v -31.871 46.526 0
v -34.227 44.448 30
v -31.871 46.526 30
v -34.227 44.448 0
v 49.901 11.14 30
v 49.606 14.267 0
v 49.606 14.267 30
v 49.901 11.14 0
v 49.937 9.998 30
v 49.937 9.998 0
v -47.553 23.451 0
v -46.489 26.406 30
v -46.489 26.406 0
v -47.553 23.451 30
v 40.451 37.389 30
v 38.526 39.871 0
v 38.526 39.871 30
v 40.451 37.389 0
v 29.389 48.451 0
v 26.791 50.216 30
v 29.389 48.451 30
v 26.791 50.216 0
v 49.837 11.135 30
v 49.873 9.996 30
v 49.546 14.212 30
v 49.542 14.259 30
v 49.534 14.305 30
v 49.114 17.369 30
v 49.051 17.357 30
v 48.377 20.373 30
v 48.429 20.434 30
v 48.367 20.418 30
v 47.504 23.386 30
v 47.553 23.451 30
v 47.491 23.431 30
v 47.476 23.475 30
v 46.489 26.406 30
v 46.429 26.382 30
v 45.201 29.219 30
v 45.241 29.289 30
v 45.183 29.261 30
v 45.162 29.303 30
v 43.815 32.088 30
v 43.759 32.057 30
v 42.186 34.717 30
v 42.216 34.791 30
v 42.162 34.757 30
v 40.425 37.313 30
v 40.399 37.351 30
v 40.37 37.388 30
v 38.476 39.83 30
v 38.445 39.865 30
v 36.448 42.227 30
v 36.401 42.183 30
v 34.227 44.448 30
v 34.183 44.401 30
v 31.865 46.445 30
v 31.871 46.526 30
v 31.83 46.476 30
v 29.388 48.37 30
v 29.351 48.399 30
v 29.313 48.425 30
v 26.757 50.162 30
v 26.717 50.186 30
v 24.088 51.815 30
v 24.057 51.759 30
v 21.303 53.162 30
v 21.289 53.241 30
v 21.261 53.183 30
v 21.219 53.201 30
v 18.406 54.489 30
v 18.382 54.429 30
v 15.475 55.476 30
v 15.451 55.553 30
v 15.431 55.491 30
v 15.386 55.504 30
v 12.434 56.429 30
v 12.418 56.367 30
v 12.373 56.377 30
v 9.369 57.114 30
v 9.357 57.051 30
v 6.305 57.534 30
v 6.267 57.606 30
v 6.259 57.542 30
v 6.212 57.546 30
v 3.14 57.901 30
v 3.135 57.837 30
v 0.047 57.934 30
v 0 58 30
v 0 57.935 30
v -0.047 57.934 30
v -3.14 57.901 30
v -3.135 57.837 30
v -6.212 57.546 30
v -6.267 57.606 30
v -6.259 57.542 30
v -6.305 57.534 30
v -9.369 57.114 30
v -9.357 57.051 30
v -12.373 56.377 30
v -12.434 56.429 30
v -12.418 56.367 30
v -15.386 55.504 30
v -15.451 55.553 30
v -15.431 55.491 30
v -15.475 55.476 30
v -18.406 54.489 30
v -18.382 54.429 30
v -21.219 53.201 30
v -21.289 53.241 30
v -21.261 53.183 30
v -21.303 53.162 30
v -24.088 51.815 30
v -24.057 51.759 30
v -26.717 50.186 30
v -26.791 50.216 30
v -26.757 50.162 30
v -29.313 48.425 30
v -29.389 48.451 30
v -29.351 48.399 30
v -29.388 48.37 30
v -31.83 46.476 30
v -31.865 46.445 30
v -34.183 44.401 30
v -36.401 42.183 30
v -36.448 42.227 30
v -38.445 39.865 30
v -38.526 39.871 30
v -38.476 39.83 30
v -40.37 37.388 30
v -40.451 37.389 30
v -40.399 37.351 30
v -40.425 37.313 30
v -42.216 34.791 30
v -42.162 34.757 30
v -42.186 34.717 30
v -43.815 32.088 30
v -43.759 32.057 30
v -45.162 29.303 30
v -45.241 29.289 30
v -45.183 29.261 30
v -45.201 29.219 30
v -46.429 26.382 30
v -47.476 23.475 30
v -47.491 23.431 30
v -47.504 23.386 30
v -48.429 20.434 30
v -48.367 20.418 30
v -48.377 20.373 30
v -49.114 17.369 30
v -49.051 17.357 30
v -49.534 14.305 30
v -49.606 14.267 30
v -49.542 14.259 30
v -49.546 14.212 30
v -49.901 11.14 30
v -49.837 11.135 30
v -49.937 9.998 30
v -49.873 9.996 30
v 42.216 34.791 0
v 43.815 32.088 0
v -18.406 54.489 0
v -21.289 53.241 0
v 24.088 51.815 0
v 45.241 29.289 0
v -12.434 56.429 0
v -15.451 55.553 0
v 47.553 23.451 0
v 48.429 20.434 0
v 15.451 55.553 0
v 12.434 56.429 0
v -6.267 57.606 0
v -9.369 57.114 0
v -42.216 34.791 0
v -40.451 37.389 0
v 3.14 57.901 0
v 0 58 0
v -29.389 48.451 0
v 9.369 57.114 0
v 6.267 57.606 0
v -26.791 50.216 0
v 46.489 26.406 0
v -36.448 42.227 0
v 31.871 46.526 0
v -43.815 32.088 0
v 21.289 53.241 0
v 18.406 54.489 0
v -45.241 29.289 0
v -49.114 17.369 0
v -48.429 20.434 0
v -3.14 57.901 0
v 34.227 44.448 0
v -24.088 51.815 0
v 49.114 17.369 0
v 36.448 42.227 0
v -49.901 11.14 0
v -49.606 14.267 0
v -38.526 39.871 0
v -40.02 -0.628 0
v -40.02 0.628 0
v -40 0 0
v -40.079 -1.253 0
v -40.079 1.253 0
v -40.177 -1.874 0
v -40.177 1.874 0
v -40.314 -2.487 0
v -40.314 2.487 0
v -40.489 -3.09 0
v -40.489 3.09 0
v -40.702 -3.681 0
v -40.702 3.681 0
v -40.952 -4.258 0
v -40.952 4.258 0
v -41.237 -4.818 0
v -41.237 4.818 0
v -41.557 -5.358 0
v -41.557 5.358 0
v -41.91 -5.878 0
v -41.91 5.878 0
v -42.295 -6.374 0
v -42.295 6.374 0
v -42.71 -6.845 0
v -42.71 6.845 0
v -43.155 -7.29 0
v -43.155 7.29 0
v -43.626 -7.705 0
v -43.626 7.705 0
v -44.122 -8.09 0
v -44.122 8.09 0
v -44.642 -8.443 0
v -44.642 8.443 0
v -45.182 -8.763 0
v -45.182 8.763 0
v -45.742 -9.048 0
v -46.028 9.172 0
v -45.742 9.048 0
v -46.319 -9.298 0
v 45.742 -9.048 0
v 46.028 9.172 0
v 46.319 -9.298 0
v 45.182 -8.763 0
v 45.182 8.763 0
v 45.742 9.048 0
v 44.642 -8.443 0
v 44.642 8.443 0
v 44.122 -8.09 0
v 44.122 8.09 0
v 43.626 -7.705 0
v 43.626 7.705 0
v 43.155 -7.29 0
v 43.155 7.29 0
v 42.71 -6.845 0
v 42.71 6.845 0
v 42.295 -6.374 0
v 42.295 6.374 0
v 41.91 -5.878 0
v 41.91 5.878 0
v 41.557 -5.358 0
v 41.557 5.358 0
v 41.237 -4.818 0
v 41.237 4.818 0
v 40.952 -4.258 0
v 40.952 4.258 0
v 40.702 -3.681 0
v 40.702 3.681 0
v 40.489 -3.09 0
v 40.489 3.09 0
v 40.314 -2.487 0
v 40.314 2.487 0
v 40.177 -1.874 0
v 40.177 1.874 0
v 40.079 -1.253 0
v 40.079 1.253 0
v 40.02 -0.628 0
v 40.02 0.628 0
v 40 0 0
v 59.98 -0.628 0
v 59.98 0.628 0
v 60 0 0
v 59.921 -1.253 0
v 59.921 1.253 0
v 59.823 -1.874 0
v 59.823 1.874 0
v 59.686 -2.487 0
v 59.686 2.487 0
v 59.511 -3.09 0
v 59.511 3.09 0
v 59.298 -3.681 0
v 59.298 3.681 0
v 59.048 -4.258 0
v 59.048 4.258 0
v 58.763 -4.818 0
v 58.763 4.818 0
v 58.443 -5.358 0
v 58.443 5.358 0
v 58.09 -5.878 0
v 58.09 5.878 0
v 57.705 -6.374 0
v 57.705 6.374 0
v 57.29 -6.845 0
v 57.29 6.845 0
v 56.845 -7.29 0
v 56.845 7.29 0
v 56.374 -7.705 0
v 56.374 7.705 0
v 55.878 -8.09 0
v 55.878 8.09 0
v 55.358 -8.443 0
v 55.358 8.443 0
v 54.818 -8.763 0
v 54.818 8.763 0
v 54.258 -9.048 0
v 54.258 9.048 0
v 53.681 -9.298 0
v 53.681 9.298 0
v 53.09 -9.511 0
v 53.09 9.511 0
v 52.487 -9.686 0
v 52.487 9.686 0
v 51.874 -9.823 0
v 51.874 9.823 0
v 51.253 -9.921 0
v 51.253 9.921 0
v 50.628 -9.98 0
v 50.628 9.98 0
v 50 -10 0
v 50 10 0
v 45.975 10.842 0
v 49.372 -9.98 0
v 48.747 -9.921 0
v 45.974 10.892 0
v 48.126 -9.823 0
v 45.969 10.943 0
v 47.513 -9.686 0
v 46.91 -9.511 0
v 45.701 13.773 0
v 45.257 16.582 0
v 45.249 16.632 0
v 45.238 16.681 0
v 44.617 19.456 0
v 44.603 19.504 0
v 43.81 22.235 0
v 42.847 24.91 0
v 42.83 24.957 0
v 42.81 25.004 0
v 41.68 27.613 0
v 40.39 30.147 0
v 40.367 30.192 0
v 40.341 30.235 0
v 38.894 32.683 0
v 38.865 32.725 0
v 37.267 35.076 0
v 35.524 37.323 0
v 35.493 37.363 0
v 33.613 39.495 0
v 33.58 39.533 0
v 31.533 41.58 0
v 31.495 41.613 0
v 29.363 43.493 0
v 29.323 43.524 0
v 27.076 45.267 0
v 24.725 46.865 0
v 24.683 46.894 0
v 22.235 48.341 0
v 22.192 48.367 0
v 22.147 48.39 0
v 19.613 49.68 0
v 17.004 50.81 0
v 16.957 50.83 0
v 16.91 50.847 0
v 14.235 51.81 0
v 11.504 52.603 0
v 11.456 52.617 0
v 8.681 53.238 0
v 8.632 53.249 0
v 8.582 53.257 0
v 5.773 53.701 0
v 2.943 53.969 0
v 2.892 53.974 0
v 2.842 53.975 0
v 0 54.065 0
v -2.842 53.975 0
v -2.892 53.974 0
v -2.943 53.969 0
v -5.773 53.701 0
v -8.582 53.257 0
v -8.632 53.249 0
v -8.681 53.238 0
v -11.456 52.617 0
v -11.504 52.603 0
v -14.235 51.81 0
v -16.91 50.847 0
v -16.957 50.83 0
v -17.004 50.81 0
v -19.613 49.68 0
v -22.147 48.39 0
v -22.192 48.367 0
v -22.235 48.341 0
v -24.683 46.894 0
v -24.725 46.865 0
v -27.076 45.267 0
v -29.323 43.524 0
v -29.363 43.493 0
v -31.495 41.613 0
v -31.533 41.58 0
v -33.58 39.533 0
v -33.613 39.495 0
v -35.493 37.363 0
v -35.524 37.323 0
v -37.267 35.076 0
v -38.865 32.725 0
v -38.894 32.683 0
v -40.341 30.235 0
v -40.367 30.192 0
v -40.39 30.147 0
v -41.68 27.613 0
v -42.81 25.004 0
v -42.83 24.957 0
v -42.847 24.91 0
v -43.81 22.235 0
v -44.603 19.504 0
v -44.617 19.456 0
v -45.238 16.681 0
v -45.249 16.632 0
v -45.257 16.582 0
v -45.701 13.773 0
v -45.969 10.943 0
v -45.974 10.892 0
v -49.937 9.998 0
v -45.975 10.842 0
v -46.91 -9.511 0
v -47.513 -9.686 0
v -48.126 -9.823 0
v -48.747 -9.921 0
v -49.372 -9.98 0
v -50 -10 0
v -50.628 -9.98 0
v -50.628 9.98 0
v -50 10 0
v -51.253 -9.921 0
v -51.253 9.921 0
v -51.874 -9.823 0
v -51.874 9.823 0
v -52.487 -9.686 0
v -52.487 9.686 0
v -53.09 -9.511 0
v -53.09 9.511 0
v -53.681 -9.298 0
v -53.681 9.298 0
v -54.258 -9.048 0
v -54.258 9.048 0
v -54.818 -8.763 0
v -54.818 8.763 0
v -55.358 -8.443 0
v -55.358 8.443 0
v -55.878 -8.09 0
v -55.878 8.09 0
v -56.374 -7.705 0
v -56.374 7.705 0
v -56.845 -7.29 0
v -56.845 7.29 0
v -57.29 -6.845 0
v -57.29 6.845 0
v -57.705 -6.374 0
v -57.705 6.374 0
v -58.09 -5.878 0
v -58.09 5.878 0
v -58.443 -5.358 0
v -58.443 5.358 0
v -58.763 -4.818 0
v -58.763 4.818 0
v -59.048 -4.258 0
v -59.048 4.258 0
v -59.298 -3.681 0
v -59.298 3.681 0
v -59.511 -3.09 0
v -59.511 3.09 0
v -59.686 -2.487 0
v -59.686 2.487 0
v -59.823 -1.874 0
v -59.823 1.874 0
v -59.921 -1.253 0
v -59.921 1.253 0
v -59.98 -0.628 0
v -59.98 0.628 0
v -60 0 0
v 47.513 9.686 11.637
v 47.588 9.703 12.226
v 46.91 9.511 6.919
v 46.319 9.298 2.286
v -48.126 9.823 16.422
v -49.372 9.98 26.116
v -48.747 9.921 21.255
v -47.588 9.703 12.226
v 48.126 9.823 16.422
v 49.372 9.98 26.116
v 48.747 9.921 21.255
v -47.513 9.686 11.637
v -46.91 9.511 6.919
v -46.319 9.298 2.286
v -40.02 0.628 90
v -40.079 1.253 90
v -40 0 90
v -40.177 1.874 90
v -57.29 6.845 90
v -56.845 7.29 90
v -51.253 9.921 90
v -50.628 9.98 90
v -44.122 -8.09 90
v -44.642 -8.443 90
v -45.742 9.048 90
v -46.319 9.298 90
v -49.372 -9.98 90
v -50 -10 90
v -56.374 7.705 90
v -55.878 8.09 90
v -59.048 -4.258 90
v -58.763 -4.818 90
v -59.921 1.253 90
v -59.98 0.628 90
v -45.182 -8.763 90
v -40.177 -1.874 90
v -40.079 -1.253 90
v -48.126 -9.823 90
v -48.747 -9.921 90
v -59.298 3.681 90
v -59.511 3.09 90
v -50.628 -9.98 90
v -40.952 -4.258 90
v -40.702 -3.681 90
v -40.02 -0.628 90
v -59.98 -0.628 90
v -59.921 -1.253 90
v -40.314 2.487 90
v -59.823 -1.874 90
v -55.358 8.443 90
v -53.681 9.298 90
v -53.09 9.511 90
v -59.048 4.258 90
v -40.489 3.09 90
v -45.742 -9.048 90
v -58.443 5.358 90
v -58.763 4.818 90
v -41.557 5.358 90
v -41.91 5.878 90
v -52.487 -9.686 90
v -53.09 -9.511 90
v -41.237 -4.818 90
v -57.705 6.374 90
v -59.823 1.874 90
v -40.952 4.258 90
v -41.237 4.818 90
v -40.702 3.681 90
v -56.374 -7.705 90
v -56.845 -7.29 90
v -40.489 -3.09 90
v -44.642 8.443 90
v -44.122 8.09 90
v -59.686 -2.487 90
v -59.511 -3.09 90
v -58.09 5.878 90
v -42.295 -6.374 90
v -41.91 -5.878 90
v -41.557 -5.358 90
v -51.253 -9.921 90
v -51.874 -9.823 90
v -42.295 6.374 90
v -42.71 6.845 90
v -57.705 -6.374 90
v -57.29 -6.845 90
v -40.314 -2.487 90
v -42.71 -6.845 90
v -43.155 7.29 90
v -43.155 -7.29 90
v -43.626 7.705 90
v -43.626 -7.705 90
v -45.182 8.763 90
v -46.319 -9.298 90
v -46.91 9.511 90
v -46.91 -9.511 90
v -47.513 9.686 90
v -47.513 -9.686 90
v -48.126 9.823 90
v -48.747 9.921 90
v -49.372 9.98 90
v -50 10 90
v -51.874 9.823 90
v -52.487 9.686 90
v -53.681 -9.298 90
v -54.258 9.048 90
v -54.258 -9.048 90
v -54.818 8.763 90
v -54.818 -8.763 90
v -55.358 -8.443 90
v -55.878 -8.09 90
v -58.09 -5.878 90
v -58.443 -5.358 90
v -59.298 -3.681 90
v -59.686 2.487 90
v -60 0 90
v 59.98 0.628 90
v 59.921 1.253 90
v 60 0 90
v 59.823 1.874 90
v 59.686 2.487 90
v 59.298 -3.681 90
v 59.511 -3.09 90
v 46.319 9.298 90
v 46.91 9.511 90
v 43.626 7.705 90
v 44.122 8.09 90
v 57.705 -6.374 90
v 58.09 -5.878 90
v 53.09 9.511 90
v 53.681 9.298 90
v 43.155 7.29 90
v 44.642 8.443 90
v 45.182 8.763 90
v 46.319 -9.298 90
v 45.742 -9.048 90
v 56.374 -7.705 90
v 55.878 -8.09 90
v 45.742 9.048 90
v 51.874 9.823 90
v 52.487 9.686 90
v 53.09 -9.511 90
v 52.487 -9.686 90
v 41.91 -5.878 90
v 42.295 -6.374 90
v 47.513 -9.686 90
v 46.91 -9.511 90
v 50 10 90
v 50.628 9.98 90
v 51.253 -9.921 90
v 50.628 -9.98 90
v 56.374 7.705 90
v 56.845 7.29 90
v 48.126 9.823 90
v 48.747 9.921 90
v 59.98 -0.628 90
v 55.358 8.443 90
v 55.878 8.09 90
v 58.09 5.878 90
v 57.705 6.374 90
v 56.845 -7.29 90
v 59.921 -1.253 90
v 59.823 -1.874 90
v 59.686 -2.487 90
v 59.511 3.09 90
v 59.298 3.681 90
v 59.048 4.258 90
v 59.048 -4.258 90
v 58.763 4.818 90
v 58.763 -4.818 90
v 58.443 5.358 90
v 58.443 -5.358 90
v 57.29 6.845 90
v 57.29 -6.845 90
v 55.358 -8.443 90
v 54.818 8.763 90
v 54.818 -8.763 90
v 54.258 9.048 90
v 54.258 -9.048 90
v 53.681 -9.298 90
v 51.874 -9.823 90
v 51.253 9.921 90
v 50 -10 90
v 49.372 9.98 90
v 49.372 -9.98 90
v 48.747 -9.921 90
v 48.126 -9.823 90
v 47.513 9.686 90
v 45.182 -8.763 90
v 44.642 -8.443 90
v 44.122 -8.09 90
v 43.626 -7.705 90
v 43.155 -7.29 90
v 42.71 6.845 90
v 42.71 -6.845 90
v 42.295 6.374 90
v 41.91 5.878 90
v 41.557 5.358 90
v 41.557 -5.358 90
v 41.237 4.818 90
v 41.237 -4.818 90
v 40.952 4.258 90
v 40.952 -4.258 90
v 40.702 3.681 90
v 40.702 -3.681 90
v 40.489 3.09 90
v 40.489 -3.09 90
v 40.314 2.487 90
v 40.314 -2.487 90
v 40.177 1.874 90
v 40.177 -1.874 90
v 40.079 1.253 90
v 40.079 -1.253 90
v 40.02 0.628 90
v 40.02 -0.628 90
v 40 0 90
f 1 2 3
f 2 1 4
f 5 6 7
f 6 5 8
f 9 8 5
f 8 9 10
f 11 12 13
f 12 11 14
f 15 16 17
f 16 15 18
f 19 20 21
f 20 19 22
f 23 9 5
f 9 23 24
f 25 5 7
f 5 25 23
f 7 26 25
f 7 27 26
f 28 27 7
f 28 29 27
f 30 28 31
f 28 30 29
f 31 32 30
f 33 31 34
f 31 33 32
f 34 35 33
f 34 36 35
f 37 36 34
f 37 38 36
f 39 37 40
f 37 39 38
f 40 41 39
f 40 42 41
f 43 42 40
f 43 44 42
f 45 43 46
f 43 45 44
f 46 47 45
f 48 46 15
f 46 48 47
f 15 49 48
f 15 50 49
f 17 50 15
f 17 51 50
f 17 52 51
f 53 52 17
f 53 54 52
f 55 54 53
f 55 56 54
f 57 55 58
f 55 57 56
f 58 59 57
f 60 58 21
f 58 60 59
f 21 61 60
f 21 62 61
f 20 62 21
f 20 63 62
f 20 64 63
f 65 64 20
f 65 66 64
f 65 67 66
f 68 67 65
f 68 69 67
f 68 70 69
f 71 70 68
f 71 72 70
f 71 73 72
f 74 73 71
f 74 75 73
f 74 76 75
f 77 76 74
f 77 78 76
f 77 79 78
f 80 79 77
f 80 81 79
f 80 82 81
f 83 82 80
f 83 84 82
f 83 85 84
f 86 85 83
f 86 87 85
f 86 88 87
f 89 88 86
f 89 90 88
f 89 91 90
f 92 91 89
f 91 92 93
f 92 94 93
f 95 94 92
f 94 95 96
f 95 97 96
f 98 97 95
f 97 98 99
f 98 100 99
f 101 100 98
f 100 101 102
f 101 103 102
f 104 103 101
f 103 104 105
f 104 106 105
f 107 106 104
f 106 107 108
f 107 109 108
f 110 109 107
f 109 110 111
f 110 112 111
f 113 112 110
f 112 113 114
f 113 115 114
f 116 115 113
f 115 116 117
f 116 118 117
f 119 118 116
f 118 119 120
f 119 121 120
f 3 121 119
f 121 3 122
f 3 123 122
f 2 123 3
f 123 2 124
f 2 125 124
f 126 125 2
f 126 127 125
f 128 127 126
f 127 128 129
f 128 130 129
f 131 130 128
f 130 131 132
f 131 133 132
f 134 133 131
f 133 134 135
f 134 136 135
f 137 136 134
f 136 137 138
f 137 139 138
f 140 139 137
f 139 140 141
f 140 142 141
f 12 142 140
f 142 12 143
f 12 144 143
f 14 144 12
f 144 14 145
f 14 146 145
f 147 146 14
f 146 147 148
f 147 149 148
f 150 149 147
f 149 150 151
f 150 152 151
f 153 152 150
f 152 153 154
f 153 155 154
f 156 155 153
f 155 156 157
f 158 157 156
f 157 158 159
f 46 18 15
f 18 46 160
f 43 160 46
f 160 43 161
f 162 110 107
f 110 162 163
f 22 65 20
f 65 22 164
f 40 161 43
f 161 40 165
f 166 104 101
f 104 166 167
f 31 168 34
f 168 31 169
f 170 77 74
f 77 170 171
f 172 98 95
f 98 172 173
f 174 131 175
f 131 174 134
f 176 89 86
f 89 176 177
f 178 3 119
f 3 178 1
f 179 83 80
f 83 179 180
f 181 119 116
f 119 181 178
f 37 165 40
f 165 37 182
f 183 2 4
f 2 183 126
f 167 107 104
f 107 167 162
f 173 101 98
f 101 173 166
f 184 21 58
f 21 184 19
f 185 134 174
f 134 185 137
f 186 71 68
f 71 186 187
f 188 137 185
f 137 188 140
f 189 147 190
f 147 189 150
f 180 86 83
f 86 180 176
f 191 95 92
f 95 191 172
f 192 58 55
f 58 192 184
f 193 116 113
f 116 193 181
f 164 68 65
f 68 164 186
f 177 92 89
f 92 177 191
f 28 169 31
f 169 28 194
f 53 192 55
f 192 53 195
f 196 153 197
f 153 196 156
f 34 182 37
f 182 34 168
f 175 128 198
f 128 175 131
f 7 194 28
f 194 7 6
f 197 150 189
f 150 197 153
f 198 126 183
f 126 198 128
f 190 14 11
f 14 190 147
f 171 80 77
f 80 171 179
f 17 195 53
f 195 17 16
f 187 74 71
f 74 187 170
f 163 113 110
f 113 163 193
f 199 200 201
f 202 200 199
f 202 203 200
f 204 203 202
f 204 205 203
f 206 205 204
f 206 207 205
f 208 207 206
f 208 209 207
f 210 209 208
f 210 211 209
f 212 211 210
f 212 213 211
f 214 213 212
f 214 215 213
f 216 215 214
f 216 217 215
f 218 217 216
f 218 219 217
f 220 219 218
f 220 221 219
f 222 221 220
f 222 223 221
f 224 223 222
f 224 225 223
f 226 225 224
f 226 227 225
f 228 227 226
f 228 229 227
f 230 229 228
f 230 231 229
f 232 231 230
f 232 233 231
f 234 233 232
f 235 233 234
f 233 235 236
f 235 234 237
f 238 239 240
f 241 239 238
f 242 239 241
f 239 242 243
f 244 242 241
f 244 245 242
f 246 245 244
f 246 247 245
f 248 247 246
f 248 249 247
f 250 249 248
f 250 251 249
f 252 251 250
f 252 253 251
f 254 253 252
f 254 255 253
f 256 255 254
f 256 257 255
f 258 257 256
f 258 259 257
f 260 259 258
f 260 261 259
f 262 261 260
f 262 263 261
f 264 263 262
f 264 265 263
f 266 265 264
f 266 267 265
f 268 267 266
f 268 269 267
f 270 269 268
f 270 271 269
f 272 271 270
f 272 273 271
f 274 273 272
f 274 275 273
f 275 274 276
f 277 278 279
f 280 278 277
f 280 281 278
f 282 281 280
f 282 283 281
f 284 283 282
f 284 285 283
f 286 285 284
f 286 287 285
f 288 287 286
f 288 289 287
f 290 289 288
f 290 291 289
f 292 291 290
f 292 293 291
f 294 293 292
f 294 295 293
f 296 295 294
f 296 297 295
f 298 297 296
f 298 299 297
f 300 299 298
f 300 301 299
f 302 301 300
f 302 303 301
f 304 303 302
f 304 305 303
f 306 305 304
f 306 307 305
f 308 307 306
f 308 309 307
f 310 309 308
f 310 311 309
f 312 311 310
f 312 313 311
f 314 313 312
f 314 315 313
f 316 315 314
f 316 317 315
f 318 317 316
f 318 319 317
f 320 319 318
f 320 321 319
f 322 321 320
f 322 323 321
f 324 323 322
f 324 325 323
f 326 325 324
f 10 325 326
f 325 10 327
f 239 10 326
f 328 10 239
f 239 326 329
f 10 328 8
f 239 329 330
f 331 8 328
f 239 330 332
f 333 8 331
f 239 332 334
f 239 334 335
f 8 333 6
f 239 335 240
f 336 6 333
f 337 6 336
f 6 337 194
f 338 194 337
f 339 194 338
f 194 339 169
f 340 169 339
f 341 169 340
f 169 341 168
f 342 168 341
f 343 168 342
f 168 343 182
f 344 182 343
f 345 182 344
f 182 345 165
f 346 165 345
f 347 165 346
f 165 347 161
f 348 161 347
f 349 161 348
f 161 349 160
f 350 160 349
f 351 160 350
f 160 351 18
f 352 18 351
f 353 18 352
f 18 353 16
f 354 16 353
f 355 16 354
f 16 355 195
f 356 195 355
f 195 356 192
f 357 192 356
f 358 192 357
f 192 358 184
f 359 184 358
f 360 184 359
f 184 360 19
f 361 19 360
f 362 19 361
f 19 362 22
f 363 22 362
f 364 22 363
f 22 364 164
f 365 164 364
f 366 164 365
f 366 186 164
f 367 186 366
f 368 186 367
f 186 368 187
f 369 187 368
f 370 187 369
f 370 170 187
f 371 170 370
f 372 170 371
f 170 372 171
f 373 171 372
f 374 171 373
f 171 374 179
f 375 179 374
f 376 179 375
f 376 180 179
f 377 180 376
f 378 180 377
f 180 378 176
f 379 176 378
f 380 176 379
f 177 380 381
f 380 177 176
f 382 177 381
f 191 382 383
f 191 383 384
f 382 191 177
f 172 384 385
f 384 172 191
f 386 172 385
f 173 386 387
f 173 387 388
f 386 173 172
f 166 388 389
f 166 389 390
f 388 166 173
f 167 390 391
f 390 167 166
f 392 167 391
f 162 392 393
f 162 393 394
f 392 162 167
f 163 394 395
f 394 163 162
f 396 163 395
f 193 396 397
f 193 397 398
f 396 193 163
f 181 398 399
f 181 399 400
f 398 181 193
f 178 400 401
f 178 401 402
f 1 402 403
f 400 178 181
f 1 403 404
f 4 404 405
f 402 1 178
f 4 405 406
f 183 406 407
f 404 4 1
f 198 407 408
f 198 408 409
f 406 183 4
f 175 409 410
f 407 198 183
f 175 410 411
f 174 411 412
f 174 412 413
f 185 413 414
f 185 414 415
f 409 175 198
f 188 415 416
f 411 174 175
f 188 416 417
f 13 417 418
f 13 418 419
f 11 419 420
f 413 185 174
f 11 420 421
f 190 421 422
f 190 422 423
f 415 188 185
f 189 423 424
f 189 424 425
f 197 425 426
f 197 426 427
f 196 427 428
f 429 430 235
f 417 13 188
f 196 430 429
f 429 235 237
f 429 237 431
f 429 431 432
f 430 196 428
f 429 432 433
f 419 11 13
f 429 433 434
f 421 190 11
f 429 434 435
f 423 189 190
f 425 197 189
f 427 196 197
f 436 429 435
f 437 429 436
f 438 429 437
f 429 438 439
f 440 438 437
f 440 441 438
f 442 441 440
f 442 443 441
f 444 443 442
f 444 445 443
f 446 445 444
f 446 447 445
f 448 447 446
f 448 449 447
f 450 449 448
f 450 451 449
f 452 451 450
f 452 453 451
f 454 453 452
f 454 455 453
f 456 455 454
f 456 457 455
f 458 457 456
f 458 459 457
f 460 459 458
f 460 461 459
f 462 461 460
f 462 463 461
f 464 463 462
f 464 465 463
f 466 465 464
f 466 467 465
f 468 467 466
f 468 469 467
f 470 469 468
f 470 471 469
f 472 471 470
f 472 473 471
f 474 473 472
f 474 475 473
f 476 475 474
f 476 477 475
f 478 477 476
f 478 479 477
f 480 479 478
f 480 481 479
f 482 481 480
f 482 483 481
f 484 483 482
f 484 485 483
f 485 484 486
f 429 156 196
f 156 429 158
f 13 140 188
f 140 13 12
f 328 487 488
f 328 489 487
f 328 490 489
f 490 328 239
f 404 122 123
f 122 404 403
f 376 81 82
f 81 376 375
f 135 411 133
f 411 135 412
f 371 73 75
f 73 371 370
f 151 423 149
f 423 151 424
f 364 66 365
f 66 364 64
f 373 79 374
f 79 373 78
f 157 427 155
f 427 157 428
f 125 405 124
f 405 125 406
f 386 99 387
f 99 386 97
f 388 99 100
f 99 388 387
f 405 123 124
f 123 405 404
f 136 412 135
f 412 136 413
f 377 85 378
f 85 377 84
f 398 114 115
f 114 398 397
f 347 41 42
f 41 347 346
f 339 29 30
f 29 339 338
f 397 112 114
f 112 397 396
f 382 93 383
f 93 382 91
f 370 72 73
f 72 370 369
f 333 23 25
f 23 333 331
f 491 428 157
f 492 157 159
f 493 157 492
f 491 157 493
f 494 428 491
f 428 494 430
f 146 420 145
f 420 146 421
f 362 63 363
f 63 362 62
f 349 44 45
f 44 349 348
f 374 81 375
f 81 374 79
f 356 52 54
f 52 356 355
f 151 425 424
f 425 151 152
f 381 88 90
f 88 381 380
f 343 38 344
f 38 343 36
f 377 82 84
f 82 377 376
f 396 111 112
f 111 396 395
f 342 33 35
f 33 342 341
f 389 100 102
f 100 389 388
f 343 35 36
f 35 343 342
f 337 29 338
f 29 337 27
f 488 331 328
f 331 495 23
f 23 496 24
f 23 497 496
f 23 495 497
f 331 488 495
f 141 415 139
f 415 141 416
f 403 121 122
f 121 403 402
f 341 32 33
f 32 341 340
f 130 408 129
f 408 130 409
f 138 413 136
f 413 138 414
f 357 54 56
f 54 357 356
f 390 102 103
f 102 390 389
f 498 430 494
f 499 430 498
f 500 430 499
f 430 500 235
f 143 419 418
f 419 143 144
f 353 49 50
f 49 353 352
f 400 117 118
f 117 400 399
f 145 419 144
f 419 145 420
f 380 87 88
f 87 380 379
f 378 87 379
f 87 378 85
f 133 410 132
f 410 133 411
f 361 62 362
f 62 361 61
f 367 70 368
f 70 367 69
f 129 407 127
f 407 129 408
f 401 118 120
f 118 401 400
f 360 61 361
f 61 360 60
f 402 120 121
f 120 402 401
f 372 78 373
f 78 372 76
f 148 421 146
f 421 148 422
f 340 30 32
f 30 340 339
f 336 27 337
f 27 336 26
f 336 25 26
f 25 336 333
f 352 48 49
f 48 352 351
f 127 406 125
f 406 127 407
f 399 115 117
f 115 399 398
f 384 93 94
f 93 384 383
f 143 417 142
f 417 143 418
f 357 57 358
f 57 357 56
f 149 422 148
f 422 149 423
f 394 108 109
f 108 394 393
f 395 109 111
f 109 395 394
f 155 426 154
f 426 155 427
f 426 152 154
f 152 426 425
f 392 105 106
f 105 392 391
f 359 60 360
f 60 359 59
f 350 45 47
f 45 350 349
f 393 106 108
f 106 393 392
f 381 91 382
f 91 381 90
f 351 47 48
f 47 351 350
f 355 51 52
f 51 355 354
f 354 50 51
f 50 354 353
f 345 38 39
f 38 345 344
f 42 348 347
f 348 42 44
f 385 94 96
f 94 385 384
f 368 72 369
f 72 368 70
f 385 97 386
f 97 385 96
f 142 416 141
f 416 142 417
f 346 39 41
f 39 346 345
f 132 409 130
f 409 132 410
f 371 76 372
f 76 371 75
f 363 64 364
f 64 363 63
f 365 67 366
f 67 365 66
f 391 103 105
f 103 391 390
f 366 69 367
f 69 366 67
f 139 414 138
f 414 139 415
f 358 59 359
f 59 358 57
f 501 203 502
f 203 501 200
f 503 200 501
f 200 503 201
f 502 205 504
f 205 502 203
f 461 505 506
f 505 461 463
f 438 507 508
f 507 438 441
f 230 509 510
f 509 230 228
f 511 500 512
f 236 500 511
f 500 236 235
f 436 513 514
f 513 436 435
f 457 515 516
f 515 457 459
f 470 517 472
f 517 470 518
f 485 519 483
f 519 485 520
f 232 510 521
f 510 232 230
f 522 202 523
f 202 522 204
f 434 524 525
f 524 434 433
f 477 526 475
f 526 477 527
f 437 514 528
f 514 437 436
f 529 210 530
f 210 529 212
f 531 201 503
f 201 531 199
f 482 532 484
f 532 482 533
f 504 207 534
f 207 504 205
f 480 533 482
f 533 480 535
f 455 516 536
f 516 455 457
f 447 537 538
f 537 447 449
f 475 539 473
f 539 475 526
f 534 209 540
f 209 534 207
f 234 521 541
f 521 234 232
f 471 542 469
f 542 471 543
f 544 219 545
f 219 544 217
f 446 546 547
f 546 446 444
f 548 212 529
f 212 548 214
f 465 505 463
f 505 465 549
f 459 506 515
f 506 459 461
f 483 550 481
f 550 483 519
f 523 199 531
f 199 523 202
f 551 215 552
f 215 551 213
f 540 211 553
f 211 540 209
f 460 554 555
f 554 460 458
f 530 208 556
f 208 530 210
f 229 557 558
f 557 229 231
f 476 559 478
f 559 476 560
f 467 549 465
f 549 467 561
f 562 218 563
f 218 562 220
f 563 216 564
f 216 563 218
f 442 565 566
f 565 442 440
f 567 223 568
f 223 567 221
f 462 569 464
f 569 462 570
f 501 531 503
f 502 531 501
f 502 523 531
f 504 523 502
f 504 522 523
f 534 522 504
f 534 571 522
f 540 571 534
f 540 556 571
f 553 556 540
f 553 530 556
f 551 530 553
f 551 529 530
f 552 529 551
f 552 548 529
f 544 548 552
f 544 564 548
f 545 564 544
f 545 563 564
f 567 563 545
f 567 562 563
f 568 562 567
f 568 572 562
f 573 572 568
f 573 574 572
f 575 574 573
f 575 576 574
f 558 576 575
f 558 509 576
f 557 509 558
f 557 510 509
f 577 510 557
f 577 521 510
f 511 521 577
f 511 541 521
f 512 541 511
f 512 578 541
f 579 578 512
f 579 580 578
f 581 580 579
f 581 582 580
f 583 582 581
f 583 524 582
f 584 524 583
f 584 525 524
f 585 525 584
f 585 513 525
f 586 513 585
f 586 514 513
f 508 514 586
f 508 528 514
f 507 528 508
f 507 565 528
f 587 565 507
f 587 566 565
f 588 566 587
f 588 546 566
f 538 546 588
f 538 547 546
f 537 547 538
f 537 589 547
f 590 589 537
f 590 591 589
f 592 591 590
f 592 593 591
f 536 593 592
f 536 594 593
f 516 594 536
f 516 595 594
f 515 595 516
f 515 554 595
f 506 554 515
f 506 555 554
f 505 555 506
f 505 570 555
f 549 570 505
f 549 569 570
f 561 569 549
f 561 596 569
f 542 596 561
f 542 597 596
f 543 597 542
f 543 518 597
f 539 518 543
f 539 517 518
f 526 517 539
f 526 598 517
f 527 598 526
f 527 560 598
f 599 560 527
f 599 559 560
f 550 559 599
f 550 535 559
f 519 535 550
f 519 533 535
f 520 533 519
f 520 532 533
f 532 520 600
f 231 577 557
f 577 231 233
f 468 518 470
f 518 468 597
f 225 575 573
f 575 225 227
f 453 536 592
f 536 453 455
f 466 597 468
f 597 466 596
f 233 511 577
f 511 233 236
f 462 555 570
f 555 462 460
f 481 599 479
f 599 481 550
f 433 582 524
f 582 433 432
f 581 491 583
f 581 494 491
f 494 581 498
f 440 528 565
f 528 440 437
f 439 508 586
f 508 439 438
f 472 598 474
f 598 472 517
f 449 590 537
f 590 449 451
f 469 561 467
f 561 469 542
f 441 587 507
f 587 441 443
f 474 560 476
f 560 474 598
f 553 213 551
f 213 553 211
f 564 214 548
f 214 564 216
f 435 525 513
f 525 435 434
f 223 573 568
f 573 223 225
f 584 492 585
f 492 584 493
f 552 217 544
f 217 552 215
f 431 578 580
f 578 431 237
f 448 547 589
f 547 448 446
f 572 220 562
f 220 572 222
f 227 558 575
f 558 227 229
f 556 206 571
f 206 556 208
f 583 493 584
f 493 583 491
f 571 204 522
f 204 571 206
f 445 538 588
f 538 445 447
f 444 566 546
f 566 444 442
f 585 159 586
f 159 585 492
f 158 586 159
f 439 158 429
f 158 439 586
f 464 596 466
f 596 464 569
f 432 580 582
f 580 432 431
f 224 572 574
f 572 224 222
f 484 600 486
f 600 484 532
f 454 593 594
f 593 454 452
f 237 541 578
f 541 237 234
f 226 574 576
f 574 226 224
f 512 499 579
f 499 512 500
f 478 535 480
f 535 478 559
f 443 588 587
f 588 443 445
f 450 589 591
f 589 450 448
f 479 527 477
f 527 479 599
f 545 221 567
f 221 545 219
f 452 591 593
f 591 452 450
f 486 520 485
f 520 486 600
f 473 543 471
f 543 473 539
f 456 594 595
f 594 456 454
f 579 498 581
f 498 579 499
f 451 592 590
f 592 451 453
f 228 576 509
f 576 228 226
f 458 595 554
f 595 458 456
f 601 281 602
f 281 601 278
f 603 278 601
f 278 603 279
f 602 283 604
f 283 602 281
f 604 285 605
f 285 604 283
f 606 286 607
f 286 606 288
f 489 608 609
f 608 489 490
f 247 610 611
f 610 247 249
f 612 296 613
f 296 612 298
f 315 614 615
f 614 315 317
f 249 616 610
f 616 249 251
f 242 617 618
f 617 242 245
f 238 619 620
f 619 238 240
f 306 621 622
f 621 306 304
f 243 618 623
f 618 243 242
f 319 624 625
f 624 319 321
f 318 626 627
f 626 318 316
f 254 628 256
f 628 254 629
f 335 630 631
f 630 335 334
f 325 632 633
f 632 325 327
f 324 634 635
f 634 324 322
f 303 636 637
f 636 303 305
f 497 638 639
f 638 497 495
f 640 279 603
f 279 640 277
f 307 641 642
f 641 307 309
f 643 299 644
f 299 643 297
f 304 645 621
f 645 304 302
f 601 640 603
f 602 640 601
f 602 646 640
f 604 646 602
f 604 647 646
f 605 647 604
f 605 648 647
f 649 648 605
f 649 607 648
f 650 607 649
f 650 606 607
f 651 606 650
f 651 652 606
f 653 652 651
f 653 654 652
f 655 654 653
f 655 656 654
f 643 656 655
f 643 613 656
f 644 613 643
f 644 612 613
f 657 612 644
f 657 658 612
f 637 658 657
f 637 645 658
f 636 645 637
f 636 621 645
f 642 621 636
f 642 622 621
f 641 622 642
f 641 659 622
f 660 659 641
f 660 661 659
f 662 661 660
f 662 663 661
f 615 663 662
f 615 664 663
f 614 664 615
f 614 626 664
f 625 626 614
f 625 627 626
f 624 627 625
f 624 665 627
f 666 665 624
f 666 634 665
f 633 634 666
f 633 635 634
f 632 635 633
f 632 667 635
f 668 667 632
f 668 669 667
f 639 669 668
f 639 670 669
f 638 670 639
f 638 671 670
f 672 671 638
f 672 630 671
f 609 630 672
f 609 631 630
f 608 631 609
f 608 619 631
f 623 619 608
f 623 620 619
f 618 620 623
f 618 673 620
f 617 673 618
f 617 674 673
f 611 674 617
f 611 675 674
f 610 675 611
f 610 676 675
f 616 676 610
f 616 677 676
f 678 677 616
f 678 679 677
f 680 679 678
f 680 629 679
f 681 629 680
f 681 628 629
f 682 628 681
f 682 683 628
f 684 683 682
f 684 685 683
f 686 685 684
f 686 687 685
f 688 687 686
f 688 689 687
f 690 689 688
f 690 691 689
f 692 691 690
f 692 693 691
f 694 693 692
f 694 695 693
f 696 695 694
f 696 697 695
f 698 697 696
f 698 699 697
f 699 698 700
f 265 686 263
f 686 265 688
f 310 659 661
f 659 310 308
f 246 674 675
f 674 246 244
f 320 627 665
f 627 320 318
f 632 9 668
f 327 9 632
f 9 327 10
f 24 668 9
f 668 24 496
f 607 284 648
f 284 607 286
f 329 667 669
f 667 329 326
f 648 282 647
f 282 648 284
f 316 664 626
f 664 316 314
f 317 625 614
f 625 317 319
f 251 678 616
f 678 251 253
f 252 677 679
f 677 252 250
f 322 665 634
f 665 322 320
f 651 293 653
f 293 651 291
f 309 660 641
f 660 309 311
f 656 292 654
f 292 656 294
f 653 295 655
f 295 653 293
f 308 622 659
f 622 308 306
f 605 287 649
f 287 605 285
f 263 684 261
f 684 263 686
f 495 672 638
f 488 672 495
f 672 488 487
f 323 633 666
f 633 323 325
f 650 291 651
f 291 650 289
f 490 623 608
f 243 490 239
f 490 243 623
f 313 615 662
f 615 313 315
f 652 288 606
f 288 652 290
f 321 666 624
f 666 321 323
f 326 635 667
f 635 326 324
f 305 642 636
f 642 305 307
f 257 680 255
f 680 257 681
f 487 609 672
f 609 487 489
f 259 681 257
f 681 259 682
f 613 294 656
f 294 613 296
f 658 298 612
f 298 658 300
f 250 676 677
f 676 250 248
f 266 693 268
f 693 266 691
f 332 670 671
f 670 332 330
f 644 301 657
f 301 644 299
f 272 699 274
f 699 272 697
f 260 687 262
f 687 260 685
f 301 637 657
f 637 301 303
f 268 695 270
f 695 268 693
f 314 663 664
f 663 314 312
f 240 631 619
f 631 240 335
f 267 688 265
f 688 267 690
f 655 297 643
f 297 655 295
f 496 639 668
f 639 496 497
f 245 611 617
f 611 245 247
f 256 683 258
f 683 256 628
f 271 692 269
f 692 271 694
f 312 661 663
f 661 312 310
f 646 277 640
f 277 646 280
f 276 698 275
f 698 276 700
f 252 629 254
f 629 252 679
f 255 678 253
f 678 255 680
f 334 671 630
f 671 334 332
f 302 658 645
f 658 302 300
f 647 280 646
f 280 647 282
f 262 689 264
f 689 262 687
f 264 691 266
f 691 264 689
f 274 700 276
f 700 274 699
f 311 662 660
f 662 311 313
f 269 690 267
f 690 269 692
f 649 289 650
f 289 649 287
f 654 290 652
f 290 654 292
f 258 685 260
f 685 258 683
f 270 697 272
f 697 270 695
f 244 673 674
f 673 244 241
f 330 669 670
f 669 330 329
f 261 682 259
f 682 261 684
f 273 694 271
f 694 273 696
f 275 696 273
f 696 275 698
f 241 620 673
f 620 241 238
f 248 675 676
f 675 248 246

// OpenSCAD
//libre scorp

// radius of handle
r=10;

// length of handles
z=90;

// blade radius
l=50;

// thickness of top of blade
t=4;

// heigth of blade
h=30;

//seperator
s=10;

n=100;

module blade(){
difference(){
cylinder(h = h, r1 = l,r2 = l, center = true, $fn=n);
cylinder(h = h+1, r1 = l-t,r2 = l, center = true, $fn=n);
translate([0,-l/2,0])cube([2*l+1,l+1,h+1], center = true);
}
}

union(){
translate([0,r-2,h/2])blade();
translate([-l,0,z/2])cylinder(h = z, r1 = r,r2 = r, center = true, $fn=n);
translate([l,0,z/2])cylinder(h = z, r1 = r,r2 = r, center = true, $fn=n);
}
